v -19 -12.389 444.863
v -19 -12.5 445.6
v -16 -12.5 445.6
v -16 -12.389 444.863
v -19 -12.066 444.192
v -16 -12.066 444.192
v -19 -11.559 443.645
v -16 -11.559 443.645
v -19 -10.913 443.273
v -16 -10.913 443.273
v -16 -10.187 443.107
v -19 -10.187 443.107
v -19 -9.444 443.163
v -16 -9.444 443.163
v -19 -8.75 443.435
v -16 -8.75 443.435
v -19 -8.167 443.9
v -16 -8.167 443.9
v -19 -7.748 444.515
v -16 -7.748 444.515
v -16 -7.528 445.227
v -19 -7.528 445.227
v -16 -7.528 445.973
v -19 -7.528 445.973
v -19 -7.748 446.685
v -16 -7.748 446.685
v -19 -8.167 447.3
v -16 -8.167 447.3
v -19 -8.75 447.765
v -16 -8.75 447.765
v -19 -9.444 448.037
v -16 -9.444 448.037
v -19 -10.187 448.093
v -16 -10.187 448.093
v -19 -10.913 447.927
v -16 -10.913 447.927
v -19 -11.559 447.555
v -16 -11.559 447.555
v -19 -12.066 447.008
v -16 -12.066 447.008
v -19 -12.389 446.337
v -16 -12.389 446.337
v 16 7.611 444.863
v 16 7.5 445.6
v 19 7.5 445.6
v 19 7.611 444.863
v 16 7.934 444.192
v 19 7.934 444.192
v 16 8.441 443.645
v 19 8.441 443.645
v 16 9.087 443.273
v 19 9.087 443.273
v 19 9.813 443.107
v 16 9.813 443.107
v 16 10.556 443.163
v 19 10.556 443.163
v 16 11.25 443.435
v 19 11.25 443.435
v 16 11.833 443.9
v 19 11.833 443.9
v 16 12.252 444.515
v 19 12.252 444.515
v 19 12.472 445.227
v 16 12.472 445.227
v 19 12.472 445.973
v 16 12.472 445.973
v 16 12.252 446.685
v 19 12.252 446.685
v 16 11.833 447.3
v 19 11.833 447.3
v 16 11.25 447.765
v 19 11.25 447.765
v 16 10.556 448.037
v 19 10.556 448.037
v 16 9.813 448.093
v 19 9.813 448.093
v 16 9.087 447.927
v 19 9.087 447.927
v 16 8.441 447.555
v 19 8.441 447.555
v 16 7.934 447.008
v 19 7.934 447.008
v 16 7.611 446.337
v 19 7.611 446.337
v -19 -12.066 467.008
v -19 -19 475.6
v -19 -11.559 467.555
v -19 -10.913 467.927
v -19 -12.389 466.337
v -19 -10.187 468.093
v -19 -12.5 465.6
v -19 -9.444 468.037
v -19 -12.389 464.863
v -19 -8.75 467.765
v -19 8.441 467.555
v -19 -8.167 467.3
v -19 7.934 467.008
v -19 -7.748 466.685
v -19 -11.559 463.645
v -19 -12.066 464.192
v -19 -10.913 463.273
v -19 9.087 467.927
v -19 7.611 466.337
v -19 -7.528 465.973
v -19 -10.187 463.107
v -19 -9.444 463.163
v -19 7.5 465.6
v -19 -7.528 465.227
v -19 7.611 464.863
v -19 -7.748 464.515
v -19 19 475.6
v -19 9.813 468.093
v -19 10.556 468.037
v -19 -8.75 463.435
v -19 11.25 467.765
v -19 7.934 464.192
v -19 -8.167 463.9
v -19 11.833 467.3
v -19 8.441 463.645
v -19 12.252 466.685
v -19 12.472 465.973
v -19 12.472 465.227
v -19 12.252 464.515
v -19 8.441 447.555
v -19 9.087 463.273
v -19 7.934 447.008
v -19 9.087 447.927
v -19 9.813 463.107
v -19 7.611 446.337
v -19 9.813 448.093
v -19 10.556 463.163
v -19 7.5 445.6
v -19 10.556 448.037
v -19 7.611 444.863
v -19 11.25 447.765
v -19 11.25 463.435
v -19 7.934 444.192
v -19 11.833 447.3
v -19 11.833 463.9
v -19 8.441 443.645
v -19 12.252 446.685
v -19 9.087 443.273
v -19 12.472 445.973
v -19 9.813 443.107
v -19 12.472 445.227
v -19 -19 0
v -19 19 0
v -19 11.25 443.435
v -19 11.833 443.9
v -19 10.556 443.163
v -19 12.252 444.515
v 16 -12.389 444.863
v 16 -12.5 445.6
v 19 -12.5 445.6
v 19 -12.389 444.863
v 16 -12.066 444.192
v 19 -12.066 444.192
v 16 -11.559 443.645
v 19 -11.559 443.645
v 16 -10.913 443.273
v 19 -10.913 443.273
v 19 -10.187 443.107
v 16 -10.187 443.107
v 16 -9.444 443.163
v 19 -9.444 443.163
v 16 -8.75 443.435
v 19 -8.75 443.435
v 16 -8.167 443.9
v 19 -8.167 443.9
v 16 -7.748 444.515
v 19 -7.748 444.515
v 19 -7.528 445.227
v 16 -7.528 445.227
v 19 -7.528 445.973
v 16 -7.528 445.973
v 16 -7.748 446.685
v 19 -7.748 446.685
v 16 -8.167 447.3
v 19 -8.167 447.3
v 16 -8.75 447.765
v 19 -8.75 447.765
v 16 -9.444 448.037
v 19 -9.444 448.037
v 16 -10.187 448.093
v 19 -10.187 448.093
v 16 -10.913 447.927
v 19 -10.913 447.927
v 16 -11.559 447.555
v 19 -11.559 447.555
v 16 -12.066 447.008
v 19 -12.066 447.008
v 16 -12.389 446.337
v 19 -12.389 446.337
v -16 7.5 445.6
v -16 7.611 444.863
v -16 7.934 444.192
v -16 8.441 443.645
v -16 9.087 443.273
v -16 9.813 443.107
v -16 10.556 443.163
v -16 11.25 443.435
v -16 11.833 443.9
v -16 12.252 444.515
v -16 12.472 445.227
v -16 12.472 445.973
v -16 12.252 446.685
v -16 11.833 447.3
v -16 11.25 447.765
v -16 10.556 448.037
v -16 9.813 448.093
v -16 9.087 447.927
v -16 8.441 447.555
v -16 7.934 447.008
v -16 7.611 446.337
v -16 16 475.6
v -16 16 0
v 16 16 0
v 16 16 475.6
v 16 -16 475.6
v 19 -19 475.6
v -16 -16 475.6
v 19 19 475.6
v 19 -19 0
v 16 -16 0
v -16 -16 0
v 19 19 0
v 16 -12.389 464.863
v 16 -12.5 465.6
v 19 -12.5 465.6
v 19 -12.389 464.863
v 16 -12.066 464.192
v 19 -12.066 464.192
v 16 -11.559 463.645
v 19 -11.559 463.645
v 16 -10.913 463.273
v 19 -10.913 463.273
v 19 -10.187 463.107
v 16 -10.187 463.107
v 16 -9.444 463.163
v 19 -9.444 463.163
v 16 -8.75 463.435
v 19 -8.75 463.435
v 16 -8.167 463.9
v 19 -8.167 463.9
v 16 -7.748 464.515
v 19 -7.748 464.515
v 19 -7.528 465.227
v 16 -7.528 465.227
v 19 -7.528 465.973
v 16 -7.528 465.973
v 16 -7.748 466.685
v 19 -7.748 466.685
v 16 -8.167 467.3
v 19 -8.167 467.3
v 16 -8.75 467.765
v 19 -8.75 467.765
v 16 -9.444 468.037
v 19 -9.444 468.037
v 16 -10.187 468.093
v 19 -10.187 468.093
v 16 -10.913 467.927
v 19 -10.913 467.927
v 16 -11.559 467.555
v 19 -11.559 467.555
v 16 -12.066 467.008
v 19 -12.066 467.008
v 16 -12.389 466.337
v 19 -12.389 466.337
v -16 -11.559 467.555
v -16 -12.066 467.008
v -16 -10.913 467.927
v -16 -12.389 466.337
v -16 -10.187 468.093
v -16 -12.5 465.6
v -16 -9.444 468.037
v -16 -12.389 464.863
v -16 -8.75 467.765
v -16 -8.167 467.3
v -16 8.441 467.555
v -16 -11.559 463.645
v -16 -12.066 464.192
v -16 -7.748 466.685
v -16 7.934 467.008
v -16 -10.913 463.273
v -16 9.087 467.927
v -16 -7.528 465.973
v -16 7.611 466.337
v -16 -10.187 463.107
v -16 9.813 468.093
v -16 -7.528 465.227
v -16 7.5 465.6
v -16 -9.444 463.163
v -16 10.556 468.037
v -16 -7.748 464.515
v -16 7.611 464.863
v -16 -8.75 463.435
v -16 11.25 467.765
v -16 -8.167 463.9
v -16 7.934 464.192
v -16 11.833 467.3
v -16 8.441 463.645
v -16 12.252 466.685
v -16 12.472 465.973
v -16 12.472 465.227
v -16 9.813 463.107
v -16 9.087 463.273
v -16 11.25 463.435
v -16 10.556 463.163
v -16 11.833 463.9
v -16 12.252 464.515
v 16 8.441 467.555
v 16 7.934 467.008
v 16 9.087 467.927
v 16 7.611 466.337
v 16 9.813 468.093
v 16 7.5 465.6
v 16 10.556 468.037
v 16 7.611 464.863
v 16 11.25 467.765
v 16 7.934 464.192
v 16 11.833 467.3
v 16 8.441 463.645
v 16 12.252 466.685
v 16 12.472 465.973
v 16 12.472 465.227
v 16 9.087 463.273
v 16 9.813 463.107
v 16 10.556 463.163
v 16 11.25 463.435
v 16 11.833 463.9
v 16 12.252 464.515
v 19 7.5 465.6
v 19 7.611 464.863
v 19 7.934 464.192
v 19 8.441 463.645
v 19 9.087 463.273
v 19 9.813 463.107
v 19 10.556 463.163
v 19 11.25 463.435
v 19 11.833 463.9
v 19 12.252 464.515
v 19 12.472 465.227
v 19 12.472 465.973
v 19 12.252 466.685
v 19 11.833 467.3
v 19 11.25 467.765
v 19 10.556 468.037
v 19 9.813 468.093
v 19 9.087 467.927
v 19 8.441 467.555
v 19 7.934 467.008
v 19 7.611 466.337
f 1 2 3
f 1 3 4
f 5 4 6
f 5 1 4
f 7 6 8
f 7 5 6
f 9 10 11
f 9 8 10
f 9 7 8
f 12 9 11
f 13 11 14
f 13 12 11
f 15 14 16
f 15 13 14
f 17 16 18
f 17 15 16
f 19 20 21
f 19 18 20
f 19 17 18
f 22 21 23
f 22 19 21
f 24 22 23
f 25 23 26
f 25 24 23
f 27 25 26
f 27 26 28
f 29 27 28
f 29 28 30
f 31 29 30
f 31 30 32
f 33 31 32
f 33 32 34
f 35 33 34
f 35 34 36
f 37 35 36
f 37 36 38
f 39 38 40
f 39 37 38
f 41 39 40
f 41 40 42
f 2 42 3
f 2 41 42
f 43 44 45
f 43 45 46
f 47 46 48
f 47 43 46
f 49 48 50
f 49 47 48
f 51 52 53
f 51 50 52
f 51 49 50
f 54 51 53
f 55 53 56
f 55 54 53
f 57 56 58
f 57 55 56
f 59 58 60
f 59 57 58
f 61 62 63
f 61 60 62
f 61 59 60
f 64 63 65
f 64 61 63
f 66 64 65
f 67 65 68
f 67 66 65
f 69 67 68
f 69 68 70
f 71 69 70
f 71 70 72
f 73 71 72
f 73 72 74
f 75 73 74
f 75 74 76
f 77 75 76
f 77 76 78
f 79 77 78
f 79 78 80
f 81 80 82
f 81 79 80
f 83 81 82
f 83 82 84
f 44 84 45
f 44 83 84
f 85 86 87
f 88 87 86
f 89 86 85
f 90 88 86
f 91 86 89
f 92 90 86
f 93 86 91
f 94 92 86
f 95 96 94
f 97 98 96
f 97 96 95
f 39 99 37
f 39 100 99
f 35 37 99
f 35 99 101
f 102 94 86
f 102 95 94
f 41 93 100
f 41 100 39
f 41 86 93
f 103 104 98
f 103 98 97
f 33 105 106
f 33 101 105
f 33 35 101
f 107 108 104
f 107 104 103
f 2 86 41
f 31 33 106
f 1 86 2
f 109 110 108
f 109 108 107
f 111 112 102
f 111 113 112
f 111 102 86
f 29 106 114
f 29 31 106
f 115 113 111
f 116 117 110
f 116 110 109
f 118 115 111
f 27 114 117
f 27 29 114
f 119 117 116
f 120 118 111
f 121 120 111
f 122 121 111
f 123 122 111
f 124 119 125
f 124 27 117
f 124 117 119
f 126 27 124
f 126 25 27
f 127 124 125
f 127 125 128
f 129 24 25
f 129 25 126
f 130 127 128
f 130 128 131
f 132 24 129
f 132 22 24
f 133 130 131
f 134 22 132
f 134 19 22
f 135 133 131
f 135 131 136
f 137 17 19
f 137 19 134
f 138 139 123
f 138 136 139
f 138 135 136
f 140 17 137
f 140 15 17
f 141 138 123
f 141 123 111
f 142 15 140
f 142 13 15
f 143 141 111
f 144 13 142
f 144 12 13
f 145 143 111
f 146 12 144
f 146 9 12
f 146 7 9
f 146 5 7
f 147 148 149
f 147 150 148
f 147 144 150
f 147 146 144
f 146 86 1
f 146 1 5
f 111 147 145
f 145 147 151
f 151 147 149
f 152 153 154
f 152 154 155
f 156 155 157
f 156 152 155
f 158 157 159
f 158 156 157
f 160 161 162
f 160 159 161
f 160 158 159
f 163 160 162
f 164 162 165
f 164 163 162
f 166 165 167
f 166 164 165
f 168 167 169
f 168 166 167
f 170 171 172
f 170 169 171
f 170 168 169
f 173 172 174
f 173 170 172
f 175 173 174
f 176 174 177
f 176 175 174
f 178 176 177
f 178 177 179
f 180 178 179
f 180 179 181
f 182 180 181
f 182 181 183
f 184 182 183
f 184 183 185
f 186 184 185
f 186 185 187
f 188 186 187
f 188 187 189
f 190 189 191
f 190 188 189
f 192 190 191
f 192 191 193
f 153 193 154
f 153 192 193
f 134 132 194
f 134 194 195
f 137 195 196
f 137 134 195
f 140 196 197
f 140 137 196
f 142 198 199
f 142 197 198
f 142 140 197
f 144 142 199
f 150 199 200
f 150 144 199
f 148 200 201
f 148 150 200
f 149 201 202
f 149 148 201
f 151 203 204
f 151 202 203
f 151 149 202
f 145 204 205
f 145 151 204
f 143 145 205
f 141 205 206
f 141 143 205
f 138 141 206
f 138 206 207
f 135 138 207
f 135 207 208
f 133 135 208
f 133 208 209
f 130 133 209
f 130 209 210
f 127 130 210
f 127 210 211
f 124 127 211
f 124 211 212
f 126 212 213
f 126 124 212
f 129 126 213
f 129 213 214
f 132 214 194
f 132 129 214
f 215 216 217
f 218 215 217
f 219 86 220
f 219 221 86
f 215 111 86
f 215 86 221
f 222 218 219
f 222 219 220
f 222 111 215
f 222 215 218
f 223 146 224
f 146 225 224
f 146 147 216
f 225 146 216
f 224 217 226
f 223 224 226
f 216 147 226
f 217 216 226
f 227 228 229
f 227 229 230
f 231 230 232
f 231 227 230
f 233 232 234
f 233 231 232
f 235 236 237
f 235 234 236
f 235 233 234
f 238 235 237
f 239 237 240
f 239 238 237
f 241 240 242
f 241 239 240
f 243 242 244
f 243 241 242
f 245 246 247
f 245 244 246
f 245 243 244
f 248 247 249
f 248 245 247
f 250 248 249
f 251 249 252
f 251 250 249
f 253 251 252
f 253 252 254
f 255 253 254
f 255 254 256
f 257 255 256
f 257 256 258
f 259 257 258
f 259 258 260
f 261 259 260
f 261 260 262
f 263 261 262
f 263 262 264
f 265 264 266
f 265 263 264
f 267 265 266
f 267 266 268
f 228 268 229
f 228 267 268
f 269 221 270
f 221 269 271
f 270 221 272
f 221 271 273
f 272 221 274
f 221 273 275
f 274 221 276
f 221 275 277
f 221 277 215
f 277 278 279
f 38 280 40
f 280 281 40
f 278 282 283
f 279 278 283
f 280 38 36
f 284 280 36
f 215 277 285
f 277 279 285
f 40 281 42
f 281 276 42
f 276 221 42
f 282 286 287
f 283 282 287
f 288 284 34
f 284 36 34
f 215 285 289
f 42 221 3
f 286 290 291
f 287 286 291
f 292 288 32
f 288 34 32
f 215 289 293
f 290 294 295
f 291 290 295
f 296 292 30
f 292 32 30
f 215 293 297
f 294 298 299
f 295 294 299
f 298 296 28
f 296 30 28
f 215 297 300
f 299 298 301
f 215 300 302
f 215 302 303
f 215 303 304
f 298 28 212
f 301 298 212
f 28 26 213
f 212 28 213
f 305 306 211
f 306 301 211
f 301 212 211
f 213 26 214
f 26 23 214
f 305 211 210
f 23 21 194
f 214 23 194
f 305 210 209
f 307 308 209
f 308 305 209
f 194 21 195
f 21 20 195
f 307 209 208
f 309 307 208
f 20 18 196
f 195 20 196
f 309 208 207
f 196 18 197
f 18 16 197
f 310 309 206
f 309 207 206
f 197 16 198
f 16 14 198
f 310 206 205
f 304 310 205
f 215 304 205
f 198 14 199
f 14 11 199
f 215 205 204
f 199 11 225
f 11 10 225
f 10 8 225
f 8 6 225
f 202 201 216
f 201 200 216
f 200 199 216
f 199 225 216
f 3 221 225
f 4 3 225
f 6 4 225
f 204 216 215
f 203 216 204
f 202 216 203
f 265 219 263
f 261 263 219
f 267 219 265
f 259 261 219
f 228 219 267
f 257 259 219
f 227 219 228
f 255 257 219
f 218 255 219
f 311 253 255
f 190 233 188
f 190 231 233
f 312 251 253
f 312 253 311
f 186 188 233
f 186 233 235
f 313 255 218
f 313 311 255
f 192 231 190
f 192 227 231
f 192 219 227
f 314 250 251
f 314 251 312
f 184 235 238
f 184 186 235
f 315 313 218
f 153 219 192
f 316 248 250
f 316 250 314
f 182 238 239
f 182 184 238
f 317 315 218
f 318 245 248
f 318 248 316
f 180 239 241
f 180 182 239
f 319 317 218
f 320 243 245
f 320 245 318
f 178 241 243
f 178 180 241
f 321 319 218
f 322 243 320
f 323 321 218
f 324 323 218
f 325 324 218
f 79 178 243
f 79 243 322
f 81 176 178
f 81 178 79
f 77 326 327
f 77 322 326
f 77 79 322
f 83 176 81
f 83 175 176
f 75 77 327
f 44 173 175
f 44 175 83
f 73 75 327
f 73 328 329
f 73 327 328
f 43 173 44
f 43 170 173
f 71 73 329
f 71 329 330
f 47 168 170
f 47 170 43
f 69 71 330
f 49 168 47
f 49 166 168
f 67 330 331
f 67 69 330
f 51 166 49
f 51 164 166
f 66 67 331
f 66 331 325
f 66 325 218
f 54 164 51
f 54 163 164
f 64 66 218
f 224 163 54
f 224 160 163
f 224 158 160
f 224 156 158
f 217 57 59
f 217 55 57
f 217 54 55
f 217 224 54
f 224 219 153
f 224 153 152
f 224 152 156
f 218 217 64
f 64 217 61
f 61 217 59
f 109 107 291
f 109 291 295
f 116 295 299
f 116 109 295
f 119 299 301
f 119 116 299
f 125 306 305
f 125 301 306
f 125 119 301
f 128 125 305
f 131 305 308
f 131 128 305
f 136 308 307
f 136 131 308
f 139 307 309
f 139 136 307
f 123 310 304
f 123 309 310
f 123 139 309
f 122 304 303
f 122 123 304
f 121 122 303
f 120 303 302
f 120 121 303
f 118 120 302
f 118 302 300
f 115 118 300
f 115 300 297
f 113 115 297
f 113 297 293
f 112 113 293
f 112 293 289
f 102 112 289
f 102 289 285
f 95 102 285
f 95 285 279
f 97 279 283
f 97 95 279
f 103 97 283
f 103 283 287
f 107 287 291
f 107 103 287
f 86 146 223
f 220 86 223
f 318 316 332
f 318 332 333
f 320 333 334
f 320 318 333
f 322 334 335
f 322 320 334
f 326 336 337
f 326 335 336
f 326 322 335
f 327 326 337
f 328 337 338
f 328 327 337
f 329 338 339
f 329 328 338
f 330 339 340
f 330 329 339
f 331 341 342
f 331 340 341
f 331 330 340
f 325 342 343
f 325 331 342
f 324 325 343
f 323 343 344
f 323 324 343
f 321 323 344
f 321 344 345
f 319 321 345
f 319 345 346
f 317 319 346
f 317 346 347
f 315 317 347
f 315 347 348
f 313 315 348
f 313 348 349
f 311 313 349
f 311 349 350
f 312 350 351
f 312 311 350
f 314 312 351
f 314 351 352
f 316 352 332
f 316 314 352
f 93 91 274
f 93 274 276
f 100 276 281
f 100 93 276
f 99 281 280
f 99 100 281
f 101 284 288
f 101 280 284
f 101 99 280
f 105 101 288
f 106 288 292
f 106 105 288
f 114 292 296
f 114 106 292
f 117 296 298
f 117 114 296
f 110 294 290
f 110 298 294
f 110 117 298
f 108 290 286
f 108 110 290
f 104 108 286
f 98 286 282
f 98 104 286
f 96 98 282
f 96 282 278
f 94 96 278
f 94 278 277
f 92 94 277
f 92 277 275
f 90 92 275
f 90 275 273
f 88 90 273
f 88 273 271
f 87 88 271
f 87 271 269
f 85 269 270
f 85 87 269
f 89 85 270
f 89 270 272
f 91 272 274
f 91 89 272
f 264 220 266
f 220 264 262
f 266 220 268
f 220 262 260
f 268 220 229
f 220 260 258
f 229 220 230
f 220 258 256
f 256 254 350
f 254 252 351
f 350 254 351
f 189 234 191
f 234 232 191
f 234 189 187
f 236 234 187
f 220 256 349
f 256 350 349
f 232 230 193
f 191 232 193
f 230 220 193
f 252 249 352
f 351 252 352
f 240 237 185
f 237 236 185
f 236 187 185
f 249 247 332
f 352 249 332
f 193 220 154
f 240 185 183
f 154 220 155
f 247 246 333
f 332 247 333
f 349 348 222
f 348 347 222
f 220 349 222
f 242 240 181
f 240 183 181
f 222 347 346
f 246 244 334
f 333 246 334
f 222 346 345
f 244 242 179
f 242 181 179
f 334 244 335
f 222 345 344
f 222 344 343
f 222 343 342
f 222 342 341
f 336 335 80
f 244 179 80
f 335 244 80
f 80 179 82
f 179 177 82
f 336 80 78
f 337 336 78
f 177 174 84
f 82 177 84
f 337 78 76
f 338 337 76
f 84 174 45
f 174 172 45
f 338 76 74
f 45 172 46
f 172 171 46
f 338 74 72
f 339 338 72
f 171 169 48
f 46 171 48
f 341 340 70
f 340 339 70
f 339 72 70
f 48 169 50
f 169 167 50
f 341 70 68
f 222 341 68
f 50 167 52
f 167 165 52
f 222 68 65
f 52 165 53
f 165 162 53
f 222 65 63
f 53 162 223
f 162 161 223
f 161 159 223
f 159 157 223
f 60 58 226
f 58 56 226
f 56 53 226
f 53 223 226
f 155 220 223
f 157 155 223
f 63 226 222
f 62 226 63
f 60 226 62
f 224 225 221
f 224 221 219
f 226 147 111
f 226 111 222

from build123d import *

# Parameters (mm, degrees)
SKETCH1_W               = 38
SKETCH1_H               = 38
SKETCH1_W_2             = 32
SKETCH1_H_2             = 32
BOSS_EXTRUDE1_DEPTH     = 475.6
CUT_EXTRUDE2_DEPTH      = 478.493832421
CUT_EXTRUDE2_DEPTH_BACK = 478.493832421
SKETCH3_R               = 2.5


with BuildPart() as part:
    # Sketch1 → Boss-Extrude1 (new body)
    with BuildSketch(Plane.XY):
        Rectangle(SKETCH1_W, SKETCH1_H)
        Rectangle(SKETCH1_W_2, SKETCH1_H_2, mode=Mode.SUBTRACT)
    extrude(amount=BOSS_EXTRUDE1_DEPTH)

    # Sketch3 → Cut-Extrude2 (cut, two sides: drawn at the far end of the back side and taken through both)
    with BuildSketch(Plane(origin=(19, 0, 0), x_dir=(0, 0, -1), z_dir=(1, 0, 0)).offset(-CUT_EXTRUDE2_DEPTH_BACK)):
        with Locations(Location((-465.6, 10, 0), (0, 0, 270))):
            Circle(SKETCH3_R)
        with Locations(Location((-445.6, 10, 0), (0, 0, 270))):
            Circle(SKETCH3_R)
        with Locations(Location((-445.6, -10, 0), (0, 0, 270))):
            Circle(SKETCH3_R)
        with Locations(Location((-465.6, -10, 0), (0, 0, 270))):
            Circle(SKETCH3_R)
    extrude(amount=CUT_EXTRUDE2_DEPTH + CUT_EXTRUDE2_DEPTH_BACK, mode=Mode.SUBTRACT)


solid = part.part
